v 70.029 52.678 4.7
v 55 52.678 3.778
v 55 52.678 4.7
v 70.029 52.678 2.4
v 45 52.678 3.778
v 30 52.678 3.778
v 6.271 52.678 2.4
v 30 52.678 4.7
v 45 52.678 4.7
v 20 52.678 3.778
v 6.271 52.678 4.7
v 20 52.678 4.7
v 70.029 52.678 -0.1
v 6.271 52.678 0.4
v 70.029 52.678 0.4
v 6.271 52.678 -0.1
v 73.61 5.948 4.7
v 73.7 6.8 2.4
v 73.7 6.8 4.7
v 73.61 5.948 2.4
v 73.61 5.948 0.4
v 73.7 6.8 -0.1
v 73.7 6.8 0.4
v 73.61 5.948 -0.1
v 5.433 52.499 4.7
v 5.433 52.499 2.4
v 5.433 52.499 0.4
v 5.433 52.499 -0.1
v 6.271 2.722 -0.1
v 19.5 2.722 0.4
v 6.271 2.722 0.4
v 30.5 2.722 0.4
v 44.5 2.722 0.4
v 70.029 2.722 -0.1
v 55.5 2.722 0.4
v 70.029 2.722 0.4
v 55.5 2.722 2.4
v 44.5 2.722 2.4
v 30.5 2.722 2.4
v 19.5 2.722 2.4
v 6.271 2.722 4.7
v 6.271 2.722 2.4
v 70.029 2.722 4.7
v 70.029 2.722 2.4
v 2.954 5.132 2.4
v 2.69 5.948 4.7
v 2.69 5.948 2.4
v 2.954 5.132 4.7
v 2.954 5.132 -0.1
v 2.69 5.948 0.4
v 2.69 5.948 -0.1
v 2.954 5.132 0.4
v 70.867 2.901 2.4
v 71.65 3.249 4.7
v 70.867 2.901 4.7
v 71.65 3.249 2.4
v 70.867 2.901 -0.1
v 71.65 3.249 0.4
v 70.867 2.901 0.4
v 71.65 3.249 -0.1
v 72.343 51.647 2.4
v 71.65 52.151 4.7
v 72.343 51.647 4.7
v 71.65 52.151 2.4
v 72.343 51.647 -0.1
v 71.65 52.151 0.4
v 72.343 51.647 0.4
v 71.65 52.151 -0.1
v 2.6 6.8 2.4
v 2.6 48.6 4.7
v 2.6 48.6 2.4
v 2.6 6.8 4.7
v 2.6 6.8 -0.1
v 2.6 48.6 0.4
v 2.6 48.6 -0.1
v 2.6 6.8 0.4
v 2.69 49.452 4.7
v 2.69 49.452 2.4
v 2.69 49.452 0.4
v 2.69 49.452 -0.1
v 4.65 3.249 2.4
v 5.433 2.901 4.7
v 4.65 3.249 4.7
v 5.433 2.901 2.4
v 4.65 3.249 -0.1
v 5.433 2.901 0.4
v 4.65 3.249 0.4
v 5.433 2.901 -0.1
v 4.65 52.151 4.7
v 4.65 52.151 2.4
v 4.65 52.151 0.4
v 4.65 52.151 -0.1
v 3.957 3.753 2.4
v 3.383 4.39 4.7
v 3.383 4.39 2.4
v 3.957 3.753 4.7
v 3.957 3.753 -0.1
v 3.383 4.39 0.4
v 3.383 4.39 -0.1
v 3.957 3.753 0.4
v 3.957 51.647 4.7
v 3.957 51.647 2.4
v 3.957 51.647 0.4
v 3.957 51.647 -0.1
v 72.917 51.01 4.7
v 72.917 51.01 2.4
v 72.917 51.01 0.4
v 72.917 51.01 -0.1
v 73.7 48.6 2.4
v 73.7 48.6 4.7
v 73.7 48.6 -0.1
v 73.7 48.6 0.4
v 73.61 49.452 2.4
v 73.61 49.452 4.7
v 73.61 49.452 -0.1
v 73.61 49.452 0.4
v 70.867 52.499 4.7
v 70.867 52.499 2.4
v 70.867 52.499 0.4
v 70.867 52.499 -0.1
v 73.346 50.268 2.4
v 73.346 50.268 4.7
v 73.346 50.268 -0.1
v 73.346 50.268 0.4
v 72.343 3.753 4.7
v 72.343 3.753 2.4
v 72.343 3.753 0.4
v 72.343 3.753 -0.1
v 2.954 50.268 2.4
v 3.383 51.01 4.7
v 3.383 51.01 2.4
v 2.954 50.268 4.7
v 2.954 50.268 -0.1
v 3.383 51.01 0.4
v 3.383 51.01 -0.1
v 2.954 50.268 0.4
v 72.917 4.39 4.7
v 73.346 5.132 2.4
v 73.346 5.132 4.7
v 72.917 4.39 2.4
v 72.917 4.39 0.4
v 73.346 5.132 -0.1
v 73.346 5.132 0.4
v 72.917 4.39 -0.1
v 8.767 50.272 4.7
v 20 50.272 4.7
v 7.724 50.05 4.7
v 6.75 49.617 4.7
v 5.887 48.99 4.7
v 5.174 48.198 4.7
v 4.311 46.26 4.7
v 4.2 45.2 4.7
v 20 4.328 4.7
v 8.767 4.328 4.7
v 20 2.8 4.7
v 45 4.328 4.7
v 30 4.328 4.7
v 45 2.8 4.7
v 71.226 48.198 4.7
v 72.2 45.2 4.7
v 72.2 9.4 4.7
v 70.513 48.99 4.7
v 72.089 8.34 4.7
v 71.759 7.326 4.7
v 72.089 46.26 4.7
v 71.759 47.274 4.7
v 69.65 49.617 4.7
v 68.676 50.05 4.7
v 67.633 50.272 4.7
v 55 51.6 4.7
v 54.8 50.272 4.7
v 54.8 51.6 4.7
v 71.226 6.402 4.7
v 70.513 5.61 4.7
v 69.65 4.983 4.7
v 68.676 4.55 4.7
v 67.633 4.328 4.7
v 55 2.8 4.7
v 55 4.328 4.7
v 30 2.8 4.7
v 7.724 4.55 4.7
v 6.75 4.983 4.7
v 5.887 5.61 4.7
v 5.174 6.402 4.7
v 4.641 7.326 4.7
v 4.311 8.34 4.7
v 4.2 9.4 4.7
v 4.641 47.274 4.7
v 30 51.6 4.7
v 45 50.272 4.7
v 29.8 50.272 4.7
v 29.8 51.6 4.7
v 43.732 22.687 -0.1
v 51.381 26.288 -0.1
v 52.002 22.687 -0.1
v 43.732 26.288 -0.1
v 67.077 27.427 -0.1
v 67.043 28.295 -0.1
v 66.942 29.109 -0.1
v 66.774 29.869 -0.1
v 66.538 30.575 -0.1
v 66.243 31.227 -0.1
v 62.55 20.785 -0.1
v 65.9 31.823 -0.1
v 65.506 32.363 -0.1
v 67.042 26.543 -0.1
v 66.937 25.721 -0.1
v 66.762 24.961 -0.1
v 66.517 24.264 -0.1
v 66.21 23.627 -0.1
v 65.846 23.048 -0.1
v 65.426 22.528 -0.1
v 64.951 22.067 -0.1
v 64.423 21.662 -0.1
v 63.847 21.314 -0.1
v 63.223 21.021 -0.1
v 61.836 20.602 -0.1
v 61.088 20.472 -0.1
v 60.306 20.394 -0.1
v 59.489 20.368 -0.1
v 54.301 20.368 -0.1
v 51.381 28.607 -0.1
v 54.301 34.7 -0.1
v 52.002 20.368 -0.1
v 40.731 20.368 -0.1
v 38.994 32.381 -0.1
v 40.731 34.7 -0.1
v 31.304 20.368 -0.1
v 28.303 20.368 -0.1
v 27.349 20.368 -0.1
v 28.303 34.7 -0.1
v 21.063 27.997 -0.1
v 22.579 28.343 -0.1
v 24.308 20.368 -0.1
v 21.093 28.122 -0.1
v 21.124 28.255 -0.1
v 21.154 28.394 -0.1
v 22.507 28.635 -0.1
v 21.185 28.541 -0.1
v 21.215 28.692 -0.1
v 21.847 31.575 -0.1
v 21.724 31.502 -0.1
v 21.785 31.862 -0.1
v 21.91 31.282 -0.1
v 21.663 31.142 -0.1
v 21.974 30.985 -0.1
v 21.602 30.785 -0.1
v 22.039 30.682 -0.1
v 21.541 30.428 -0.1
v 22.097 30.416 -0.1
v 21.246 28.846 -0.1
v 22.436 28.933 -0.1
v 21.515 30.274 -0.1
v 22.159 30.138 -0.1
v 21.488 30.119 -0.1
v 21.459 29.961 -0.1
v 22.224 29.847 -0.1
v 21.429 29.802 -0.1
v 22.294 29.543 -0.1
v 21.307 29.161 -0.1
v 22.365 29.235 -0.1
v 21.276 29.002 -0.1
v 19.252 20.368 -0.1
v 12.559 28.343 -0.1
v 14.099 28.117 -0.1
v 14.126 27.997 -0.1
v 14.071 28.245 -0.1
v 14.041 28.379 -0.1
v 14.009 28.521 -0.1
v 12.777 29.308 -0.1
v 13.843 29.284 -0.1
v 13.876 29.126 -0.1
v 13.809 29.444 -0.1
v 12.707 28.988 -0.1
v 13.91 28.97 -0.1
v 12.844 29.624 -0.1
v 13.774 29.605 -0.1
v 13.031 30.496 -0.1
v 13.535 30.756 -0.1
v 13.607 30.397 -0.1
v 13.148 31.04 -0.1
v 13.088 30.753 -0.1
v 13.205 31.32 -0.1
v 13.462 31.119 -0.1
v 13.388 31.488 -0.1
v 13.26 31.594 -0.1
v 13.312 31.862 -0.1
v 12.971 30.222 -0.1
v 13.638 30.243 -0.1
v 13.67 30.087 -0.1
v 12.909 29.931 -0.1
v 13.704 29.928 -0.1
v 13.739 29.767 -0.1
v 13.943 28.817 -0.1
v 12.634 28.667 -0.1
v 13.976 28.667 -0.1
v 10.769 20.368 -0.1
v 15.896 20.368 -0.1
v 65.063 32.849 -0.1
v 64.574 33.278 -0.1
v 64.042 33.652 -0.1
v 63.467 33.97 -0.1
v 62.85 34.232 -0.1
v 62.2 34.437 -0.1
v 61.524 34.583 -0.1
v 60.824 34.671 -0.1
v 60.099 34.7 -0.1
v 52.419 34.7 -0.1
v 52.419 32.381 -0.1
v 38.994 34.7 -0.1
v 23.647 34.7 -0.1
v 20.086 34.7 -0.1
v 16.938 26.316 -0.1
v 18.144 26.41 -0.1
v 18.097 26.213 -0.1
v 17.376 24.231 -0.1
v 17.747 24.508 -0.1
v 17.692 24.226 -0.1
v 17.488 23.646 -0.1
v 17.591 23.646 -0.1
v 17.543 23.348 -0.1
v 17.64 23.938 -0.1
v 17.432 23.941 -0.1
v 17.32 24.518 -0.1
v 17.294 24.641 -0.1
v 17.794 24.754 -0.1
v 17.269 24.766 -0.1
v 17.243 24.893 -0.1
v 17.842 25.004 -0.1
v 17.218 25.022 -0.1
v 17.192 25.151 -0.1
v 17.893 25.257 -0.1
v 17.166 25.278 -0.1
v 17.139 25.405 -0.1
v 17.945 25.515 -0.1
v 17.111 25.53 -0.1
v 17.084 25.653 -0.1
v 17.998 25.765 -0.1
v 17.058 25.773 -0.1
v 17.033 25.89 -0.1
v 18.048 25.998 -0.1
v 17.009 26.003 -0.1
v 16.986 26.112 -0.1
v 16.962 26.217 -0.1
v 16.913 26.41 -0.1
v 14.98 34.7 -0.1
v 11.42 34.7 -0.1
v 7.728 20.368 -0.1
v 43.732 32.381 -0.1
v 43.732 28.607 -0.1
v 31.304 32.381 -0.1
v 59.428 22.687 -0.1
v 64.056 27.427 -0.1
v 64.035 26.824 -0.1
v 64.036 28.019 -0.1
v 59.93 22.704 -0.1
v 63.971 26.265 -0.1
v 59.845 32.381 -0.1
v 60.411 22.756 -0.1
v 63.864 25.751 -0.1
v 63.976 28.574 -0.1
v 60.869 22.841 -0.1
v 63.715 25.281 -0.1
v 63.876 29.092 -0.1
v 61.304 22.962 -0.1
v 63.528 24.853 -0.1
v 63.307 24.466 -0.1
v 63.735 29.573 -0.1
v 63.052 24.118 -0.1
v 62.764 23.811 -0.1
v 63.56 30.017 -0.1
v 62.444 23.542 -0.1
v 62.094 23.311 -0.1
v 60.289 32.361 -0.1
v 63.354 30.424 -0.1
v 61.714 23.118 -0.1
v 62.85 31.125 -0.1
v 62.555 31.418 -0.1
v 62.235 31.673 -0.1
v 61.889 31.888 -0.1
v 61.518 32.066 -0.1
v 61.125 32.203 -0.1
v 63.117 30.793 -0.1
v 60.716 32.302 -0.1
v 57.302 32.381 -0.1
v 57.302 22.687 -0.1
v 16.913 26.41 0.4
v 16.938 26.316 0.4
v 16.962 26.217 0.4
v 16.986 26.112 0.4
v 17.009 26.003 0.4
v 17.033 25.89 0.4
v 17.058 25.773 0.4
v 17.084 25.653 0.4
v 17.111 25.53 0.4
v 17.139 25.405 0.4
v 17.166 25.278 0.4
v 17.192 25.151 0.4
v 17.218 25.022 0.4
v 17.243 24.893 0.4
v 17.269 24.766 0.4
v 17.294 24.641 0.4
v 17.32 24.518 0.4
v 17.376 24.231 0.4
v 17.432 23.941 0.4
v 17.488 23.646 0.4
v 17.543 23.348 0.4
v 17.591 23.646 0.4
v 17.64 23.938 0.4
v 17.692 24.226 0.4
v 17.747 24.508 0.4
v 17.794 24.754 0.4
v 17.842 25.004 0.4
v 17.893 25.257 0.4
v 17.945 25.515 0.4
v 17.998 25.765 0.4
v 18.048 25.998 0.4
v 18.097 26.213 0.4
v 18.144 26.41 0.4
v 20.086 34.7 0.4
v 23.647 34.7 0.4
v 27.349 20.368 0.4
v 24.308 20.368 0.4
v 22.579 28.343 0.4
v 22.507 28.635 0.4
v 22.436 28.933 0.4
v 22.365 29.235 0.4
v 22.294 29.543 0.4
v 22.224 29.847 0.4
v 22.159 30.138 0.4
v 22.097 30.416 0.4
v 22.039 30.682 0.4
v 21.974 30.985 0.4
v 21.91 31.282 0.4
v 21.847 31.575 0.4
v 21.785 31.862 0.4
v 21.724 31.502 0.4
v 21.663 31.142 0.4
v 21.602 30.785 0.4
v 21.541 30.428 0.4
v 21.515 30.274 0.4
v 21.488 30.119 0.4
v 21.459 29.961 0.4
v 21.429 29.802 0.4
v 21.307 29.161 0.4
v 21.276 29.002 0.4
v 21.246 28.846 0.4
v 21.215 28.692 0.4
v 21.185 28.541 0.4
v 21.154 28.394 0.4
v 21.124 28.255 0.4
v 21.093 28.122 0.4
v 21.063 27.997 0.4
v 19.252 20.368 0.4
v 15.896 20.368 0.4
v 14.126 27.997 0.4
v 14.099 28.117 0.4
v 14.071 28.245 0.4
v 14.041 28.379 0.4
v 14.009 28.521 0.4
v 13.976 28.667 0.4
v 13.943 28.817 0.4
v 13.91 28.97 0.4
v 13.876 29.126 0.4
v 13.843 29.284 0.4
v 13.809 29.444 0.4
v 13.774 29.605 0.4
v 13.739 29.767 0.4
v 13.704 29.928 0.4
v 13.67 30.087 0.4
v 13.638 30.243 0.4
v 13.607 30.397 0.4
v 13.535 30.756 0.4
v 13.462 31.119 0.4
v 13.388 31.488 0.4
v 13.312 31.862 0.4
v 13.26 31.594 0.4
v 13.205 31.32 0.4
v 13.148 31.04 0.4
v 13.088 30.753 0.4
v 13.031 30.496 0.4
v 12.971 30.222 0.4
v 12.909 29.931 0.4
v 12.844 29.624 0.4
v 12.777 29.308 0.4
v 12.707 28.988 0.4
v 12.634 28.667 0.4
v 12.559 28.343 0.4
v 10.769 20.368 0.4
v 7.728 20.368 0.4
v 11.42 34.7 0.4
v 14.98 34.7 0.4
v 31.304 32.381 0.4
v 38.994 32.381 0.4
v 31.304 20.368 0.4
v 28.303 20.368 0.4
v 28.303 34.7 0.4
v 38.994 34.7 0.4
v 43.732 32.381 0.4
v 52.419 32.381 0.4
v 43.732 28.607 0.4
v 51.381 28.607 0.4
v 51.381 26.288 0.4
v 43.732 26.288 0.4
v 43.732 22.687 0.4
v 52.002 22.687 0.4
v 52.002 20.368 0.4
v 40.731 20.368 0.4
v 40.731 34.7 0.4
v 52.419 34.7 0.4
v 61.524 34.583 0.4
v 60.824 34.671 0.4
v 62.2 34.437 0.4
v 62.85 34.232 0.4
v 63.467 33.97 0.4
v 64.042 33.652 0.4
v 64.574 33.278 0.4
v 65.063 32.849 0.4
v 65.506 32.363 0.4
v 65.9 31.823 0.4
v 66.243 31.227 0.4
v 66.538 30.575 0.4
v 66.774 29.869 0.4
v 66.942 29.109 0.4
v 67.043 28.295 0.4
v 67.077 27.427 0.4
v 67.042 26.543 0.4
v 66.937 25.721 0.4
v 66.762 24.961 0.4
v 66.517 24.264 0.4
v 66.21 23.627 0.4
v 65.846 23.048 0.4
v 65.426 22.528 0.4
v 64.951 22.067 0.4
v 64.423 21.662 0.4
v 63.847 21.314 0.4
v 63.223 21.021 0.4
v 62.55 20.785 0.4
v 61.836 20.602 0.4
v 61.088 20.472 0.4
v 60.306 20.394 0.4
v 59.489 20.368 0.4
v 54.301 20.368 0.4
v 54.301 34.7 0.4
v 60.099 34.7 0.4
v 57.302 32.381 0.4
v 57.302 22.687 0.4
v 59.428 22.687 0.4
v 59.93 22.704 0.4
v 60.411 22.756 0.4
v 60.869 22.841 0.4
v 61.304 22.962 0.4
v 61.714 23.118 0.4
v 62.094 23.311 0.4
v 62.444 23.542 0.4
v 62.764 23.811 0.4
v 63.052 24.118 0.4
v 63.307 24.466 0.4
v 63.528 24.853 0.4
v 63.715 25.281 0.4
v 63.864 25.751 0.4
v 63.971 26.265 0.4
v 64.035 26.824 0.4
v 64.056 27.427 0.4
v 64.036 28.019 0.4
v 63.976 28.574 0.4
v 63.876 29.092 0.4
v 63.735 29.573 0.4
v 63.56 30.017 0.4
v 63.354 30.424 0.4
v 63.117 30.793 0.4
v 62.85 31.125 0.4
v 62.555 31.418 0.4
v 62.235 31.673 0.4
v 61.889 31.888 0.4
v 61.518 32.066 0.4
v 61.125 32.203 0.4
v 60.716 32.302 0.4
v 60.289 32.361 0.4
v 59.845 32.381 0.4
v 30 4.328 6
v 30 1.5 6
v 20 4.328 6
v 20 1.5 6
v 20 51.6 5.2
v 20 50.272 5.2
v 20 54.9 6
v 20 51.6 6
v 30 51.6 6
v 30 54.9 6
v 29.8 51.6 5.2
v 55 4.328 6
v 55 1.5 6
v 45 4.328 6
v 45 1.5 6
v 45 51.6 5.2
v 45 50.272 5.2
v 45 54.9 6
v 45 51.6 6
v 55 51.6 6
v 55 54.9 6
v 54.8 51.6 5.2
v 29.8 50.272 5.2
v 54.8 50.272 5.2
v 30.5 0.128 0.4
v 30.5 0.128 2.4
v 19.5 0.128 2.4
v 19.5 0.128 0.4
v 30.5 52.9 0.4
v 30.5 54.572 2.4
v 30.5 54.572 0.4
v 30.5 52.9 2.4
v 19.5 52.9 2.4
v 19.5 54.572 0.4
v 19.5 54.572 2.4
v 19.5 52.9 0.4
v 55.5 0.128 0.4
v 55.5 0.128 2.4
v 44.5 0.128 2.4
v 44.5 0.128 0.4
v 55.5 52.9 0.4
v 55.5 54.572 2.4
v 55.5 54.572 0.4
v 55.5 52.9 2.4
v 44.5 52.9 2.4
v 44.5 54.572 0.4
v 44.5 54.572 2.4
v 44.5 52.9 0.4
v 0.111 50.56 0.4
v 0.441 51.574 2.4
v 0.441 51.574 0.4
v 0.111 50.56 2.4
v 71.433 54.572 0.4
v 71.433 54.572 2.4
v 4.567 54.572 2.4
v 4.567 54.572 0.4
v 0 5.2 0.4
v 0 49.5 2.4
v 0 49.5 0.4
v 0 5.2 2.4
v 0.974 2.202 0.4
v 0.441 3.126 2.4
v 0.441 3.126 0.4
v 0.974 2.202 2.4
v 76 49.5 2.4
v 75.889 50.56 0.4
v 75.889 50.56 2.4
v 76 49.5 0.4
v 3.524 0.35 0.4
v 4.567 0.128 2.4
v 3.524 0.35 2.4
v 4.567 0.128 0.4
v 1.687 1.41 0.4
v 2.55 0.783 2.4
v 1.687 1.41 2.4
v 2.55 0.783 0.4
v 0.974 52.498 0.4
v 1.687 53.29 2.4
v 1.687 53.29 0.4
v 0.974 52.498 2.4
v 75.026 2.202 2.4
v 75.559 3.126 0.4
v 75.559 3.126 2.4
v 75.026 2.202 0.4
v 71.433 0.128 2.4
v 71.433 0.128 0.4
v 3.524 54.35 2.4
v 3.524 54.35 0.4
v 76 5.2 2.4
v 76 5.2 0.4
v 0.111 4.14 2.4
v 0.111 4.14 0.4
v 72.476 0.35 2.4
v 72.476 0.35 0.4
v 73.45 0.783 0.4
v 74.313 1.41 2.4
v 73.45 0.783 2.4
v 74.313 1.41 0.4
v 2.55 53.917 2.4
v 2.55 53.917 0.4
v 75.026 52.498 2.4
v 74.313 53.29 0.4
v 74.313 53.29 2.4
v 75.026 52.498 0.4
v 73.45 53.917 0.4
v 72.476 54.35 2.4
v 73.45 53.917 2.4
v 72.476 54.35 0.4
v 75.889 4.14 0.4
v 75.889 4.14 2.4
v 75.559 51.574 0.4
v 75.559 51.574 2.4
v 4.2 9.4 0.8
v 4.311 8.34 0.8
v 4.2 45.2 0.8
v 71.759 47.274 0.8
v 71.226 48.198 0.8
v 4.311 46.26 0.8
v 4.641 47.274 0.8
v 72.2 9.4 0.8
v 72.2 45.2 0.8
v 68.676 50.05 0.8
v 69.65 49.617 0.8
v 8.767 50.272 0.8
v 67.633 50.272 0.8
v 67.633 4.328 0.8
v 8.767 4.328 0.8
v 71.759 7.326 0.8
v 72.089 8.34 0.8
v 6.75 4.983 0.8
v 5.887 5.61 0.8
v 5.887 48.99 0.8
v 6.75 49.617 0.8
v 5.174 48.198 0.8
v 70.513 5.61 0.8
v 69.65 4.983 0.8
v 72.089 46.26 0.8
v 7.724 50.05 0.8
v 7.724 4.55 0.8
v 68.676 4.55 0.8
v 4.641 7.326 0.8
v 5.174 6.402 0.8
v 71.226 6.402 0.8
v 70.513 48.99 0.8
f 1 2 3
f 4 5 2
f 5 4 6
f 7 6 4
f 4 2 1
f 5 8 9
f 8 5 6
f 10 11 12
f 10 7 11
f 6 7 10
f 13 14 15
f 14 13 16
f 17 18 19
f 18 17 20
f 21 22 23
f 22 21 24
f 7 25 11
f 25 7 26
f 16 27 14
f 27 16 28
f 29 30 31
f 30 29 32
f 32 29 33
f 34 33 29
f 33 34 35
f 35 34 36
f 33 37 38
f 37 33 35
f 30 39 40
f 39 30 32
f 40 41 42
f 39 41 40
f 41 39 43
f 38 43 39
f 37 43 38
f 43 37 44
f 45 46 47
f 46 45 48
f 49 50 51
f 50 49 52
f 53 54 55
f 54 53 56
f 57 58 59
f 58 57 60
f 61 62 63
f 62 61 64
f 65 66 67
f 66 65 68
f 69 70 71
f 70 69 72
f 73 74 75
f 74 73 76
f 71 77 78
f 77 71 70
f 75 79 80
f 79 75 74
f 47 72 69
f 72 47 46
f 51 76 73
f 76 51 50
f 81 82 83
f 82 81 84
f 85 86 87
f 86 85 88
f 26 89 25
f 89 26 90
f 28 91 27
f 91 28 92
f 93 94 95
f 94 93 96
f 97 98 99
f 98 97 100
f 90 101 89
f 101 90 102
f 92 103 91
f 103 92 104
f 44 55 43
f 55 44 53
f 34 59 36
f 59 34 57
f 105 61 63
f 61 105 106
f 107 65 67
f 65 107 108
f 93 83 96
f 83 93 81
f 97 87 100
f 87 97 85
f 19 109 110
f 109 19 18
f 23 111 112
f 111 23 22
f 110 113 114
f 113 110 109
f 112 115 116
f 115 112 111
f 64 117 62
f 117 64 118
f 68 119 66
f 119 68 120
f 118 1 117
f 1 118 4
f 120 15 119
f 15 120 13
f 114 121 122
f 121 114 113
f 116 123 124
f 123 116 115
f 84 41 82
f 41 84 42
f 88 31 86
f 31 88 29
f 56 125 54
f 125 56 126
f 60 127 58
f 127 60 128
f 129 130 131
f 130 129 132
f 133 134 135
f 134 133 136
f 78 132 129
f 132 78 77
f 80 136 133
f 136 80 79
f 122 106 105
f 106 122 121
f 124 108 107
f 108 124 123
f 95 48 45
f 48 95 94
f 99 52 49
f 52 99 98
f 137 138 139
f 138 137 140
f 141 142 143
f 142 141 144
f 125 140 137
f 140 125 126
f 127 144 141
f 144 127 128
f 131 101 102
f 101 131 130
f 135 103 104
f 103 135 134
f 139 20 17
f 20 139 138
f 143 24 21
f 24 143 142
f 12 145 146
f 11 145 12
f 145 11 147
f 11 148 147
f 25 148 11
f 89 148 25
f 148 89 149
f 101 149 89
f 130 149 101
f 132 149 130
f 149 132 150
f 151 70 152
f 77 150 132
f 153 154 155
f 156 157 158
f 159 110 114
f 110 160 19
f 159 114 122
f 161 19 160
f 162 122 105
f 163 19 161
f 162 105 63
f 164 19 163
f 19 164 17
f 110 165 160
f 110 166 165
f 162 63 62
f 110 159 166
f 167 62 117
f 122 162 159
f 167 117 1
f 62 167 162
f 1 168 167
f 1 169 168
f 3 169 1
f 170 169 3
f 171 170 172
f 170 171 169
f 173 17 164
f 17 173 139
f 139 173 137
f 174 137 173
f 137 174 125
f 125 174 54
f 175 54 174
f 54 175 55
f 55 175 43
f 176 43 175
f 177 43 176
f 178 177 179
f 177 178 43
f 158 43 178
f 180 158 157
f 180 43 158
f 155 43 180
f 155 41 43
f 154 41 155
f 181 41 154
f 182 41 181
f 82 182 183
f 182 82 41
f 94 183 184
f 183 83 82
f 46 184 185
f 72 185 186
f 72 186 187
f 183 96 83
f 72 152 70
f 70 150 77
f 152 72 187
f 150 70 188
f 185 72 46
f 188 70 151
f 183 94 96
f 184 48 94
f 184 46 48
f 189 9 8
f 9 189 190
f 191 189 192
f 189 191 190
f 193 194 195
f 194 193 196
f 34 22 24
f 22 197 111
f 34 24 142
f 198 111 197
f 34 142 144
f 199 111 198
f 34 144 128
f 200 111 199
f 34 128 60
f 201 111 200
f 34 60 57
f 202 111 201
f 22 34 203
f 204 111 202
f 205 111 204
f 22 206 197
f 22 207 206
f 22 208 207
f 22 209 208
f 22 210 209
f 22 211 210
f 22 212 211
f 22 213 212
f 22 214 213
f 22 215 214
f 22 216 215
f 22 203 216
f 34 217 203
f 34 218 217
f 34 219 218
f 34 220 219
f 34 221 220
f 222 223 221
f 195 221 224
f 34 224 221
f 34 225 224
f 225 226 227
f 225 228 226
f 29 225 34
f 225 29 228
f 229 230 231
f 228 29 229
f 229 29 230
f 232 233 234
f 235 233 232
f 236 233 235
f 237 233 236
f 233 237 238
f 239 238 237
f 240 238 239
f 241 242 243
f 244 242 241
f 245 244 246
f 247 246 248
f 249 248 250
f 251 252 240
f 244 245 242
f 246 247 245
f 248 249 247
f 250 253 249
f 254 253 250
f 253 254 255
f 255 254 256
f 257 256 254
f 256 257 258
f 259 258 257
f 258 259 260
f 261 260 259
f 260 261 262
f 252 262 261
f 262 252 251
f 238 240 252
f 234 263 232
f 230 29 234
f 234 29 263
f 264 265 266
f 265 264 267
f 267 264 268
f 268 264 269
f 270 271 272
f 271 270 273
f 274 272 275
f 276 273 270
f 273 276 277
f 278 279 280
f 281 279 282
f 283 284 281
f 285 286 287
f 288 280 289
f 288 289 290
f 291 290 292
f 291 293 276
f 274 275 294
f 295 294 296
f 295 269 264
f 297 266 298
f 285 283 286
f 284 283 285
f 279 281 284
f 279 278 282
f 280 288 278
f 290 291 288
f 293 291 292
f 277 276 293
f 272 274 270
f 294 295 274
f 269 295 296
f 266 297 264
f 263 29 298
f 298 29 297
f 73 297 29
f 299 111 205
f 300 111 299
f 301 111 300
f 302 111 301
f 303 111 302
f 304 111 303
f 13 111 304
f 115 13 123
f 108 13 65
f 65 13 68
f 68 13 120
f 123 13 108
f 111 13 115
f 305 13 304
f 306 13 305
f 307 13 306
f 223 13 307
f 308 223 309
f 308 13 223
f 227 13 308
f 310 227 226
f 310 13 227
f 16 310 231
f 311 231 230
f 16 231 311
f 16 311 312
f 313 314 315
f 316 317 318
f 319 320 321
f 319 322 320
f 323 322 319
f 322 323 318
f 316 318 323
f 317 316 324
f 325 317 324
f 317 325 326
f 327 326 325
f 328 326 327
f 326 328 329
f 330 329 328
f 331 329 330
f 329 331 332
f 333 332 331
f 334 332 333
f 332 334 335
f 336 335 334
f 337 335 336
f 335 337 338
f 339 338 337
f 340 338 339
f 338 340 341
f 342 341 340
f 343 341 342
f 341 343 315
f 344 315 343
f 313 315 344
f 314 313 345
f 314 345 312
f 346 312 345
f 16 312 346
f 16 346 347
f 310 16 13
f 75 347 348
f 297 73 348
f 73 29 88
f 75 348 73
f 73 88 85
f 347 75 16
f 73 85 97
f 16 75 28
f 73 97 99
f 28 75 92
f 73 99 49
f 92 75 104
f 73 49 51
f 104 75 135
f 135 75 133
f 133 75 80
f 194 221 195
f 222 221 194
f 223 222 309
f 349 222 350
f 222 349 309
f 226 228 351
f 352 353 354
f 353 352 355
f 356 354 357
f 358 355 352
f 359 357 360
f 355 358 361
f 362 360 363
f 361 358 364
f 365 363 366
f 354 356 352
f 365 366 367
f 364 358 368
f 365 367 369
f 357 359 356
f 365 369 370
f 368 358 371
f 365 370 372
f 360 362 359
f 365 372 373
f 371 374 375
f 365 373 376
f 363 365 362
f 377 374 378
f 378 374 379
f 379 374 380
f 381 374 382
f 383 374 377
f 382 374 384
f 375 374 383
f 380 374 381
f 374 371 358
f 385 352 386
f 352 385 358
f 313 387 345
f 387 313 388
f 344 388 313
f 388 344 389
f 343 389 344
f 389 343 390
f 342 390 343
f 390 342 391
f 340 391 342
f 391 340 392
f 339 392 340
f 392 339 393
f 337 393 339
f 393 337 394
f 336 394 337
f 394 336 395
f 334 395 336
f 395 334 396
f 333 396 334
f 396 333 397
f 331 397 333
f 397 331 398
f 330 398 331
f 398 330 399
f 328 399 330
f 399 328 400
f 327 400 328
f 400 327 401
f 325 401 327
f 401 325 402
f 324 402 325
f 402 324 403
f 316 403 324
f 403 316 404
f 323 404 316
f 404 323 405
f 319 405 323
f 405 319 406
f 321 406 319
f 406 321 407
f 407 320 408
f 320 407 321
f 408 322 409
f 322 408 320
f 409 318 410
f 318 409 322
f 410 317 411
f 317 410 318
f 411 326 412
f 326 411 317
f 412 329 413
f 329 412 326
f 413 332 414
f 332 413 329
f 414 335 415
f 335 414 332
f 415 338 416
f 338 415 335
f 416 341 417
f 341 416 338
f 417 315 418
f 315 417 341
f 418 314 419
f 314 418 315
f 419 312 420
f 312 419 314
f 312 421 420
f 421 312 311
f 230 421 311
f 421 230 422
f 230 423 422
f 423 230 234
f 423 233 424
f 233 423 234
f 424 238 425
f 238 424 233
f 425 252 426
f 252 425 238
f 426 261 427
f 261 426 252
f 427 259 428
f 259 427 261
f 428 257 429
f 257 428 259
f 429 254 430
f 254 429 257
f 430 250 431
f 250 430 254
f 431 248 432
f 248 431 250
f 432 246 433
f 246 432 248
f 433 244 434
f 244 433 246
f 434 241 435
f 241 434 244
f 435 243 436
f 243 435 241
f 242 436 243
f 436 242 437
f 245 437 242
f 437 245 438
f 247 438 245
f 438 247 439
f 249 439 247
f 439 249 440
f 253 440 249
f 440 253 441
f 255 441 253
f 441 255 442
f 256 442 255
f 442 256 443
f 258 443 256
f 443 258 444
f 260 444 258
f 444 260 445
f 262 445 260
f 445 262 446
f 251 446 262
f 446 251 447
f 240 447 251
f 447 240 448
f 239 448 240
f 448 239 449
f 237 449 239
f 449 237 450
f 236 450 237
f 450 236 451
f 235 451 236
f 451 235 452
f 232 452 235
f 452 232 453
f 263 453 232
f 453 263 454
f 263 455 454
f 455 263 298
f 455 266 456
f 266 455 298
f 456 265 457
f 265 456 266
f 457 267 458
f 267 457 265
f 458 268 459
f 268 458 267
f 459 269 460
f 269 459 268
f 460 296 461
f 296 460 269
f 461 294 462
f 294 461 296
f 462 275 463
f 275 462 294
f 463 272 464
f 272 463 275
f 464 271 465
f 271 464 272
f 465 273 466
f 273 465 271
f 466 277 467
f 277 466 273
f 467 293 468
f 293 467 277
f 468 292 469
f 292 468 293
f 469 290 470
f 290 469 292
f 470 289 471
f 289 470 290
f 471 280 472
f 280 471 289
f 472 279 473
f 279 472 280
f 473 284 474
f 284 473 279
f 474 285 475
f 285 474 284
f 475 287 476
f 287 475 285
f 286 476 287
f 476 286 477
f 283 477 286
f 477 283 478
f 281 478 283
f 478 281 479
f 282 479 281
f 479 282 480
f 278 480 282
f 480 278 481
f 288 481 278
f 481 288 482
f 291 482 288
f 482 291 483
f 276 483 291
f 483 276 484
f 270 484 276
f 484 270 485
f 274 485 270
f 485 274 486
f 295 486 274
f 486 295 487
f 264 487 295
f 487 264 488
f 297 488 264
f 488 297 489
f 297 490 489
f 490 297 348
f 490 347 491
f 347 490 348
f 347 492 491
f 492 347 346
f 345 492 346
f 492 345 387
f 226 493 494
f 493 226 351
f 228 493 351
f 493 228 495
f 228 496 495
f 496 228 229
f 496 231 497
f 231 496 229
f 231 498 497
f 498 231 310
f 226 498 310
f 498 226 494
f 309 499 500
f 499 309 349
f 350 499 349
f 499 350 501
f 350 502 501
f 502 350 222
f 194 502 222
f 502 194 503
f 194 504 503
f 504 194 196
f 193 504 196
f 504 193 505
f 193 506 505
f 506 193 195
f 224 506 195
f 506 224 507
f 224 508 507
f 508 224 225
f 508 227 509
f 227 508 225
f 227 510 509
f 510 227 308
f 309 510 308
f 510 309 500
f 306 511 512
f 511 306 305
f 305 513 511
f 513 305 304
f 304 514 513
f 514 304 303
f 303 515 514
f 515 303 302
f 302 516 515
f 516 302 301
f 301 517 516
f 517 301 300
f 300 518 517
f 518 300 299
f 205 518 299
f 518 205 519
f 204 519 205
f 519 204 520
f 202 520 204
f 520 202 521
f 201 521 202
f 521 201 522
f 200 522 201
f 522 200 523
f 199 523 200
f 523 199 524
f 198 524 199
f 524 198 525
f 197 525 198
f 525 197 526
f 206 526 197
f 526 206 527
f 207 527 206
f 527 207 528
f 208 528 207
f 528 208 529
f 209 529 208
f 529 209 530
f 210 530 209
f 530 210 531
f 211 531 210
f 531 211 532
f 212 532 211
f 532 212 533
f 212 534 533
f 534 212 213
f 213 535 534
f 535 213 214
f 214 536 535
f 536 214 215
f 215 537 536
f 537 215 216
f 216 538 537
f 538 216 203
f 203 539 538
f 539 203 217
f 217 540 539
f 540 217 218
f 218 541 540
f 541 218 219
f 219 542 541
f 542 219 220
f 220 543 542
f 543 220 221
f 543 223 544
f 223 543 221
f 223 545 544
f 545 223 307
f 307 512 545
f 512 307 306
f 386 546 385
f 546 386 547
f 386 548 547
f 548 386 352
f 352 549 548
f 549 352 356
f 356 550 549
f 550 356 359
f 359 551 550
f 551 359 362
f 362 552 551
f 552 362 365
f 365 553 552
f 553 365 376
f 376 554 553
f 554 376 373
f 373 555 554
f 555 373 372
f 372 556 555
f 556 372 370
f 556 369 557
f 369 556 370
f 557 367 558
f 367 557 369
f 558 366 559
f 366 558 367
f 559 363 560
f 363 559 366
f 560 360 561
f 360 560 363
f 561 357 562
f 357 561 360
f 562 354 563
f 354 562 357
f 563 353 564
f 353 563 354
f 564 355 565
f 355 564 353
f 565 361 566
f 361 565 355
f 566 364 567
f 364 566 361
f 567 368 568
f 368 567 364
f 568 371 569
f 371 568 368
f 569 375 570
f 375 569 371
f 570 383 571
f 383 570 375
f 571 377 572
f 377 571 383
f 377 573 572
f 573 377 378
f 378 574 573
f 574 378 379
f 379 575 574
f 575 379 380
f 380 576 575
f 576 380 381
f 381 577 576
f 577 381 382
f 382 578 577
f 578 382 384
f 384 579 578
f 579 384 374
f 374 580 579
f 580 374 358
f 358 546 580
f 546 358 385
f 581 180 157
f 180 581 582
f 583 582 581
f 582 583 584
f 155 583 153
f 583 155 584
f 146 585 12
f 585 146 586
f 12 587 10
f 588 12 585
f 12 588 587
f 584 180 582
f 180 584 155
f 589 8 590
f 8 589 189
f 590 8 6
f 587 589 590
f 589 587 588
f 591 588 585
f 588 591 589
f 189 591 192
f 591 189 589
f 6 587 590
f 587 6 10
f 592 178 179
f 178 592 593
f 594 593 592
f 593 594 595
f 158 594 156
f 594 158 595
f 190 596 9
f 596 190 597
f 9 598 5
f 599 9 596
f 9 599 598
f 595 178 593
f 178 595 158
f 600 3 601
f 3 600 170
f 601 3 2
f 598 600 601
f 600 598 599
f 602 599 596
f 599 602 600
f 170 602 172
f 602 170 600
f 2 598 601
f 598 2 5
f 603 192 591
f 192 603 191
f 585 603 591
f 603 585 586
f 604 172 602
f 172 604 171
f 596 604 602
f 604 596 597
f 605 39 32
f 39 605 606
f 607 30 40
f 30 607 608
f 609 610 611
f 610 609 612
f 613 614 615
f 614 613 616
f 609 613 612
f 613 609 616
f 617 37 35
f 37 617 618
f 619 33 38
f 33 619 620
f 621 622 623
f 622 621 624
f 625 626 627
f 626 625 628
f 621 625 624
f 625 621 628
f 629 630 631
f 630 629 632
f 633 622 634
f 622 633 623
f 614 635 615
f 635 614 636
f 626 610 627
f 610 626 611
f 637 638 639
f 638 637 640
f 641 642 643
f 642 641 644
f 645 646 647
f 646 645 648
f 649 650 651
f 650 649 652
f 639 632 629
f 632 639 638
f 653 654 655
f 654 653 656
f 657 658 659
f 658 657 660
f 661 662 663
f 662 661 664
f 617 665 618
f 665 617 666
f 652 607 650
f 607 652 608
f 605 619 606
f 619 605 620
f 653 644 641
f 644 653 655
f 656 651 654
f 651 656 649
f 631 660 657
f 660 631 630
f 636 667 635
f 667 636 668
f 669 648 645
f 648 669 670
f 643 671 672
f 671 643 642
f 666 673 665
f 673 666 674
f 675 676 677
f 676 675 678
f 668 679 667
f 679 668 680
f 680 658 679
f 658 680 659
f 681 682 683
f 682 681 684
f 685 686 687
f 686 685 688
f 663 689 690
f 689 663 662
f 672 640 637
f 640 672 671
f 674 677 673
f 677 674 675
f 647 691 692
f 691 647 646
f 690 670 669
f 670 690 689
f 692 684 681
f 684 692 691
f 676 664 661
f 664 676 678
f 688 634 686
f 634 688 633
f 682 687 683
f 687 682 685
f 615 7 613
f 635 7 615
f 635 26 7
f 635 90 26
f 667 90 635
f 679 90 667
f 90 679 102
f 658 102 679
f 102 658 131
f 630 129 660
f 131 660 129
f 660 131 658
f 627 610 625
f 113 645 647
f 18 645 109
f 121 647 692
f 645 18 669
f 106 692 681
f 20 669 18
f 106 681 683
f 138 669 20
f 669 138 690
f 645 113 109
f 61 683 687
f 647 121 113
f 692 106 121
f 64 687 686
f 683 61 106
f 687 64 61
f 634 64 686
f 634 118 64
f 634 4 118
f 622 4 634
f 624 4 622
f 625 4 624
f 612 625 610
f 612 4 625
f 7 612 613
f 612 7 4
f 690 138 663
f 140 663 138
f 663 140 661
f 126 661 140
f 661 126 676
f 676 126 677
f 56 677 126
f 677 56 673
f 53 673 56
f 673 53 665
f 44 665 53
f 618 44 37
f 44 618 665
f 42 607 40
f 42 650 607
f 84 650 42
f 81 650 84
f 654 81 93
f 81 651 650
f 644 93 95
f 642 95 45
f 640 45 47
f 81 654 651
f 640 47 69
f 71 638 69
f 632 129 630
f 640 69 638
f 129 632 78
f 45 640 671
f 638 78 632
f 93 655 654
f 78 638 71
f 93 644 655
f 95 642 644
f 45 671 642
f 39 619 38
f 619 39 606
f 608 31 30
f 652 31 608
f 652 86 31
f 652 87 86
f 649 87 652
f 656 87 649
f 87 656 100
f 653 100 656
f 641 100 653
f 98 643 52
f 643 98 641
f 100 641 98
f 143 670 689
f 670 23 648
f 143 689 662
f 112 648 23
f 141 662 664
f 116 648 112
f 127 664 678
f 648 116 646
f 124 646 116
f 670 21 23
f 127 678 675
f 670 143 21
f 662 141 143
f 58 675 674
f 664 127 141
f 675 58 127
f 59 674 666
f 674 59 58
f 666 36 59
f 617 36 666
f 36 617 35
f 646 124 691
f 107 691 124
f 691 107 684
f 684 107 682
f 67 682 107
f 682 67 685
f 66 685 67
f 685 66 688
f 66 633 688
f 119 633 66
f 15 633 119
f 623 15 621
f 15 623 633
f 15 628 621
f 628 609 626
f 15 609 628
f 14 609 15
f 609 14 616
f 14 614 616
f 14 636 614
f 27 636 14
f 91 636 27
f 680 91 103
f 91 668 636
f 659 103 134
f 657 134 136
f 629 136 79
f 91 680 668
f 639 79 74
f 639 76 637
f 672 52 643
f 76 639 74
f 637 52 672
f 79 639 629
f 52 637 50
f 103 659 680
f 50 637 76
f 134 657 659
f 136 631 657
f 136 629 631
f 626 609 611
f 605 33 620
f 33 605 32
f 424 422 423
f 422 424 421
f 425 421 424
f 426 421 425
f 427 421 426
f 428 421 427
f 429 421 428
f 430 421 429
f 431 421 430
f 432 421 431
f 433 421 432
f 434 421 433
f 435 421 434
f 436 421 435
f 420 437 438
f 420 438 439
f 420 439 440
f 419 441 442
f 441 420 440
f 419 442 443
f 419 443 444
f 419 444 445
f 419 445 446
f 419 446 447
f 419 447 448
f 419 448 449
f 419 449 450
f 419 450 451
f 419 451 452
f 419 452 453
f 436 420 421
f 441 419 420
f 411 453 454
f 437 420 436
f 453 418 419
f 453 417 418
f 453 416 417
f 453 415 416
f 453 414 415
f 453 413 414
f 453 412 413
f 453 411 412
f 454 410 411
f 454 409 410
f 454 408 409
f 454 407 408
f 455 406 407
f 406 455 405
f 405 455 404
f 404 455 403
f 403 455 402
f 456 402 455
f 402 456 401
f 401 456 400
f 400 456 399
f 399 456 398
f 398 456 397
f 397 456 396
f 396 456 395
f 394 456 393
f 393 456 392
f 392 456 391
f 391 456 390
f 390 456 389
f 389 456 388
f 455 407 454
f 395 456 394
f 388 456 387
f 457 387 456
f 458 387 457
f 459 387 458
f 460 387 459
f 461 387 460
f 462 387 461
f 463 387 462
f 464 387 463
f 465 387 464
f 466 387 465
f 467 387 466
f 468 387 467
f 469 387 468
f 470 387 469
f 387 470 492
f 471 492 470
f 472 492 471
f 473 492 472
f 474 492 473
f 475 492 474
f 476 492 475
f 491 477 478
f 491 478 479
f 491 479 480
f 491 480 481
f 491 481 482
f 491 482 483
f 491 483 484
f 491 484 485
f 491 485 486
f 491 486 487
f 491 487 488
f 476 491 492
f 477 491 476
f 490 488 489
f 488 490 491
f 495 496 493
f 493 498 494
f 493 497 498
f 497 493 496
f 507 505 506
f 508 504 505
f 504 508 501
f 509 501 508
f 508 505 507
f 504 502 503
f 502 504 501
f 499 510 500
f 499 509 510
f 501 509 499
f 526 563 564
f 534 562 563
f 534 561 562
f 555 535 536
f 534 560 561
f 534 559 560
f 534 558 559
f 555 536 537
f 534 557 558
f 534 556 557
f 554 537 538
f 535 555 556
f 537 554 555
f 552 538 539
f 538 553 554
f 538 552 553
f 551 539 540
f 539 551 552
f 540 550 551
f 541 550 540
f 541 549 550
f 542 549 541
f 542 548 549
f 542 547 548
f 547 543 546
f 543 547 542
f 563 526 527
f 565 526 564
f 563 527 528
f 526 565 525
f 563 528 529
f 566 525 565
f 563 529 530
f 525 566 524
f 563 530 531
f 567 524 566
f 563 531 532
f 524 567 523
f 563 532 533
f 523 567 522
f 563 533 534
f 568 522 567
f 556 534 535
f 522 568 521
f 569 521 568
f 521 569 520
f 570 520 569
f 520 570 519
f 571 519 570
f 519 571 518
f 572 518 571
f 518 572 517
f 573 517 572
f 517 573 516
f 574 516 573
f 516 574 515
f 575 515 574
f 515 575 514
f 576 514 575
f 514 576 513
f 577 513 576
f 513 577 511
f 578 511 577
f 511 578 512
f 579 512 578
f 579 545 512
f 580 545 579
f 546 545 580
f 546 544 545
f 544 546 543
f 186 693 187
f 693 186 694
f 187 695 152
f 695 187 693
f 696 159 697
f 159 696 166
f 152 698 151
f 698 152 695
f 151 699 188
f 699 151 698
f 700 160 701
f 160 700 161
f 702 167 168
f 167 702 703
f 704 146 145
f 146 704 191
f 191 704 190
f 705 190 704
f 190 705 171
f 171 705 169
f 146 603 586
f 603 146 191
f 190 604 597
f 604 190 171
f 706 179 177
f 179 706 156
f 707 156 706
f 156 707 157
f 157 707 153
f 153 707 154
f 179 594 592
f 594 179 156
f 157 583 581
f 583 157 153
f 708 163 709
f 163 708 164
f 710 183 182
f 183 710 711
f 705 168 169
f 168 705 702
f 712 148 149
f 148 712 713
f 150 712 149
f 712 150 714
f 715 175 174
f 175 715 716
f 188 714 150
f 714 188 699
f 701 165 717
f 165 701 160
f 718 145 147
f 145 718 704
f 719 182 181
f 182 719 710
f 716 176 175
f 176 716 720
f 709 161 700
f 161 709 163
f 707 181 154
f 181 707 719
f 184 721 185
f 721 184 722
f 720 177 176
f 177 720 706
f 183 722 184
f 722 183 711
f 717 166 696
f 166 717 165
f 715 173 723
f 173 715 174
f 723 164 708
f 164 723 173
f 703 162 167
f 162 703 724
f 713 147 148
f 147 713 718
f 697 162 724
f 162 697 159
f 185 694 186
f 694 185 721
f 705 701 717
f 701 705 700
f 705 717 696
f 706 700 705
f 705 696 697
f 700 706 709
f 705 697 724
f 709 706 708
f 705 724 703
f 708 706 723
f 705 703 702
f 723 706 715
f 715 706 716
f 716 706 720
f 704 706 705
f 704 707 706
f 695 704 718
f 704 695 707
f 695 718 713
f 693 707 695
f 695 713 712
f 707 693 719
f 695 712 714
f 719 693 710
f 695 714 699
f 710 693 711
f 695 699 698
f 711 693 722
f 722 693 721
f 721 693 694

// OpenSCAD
// file: _item_wirebox.scad
/*
 The optional box for power and neopixeljack
*/
use <_item_case.scad>
use <cuberounded.scad>

module wirebox(){
  translate([-4.5,-4.5,4.6])
  union(){
    difference(){
      cuberounded([45.0,58.4,27],5.1);
      
      //removes box attachment with a small gap
      translate([-59.1,6.5,-2.6])
      thebox();
      
      //removes box attachment with offset for top
      translate([-59,6.5,55])
      mirror([0,0,1])
      thebox();
      
      //removes box attachment with offset for bottom
      translate([-59,6.5,-28])
      thebox();
      
      // removes box inner negative
      translate([-0.1,0,-0.1])
      cube([11.4,58.6,27.5]);
      
      // innerspace
      translate([19,3,2])
      cube([21.4,52,22]);
      
      translate([0,15,6])
      cube([20,29,17]);
      
      
      translate([0,4,-0.1])
      cube([14.4,50.5,3]);
      
      // Power hole
      translate([43.6,40,14])
      //11.5
      rotate([90,0,90])
      cylinder(r=5.75,h=1.5);
      
      // Power hole inner
      translate([40.3,40,14])
      //11.5
      rotate([90,0,90])
      cylinder(r=6.75,h=3.5);
      
      // Neopixeljack
      translate([40.3,15,12])
      union(){
        cube([4.8,8,4.5]);
        
        translate([0,2,0])
        cube([4.8,4,7.5]);
        
        translate([3.7,-1,-1.2])
        cube([1.1,10,6.9]);
      }
    }
  }
}

wirebox();
// file: _item_case.scad
/*
 The box for the first versions of wled shield case
*/
use <_item_lid.scad>
use <cuberounded.scad>

module sidestickholder(){
  translate([5,-1,7.5])
  cube([6.5,2,18.5]);
  
  translate([62.7,-1,6.4])
  cube([5,2,19]);
}

module pickers(sticks=false){
  picker(sticks);

  translate([0,41.2,0])
  picker(sticks);

  translate([56.2,0.2,0])
  picker(sticks);

  translate([56.2,41.2,0])
  picker(sticks);
}

module picker(stick=false){
  translate([8.5,2.5,8])
  union(){
    rotate([180,0,0])
    cylinder(4.5,1.8,0.5);
    
    if (stick){
      translate([0,0,-1.5])
      cylinder(h=20.0,r=2.3);
      
      translate([0,0,17.5])
      cylinder(h=1,r=5.3);
    }
  }
}

module fixinghole(){
  union(){
    cylinder(1.4,3.2,3.2);
    
    translate([0,0,1.0])
    cylinder(1.1,2.8,2.8);
    
    translate([0,0,3.-1])
    cylinder(1.4,2.3,2.3);
    
    translate([0,0,3.0])
    cylinder(1.4,3.2,3.2);
  }
}

module mesh(size=[1,1,1]){
  size=(size[0]==undef) ? [size,size,size] : size;
  
  linear_extrude(size[2])
  for(rx=[0:size[0]-1]){
    translate([rx*4,,0])
    for(ry=[0:size[1]-1]){
      translate([0,ry*9,0])
      union(){
        polygon(points=[[0,0],[3,0],[0,3]],paths=[[0,1,2]],convexity=10);
        
        translate([0,1,0])
        polygon(points=[[3,3],[0,3],[3,0]],paths=[[0,1,2]],convexity=10);
        
        translate([0,5,0])
        polygon(points=[[3,3],[3,0],[0,0]],paths=[[0,1,2]],convexity=10);
        
        translate([0,6,0])
        polygon(points=[[0,0],[3,3],[0,3]],paths=[[0,1,2]],convexity=10);
      }
    }
  }
}

module wireholes(){
  fixinghole();

  translate([0,5,0])
  fixinghole();

  translate([0,10,0])
  fixinghole();

  translate([0,15,0])
  fixinghole();

  translate([0,20,0])
  fixinghole();

  translate([0,25,0])
  fixinghole();
}

module thebox(){
  
  sidestickholder();
  
  translate([0,46.2,0])
  sidestickholder();
  
  pickers(sticks=true);
  
  translate([-4.5,-4.5,4.6])
  difference(){
    // The BOX
    translate([-2,-2,-2])
    cuberounded([80,58.5,27],5.1);
    
    // Space for the lid
    prelid();
    
    // Inner Grind
    translate([3.4,3.4,-1]) 
    cuberounded([69.4,48.4,22.5],4.1);
    
    // Frontside cabel injection hole 
    translate([72,11,-4])
    cuberounded([7,33.2,14.9],0.8,true);
    
    // Frontside cabel injection hole 
    translate([74.5,9,-3])
    cuberounded([2.0,37.2,16.9],0.8,true);
    
    // Backside ventilation
    translate([3.5,10,0])
    rotate([-90,-90,90])
    scale([2,2,1.5])
    mesh([3,2,4]);
    
    // Leftside inner tag WLED
    translate([66.6,3.7,4])
    rotate([90,0,0])
    linear_extrude(0.5)
    text("WLED",15,font="Liberation Sans:style=Bold",halign="right");
    
    // Leftside outside tag WLED
    translate([69.6,-1.5,3.4])
    rotate([90,0,0])
    linear_extrude(0.5)
    text("WLED",15,font="Liberation Sans:style=Bold",halign="right");
    
    translate([4.5,4.5,-5])
    union(){
      // Button hole
      translate([31.8,53,22.5])
      rotate([90,90,0])
      cylinder(h=4,r1=2,r2=2.4);
      translate([27.5,50,27.3])
      rotate([90,90,0])
      cube([9,9,4.5]);
      
      // wire attachments
      translate([58.5,9.7,26.0])
      wireholes();
      
      //displaywindow inner
      translate([-2.2,-1.6,0])
      translate([12.7,9.4,26.4])
      cuberounded([14,30.5,2],0.4);
      cube(0);
      
      //displaywindow outer
      translate([-2.2,-1.6,0])
      translate([13.3,11.6,26.4])
      cuberounded([13,27.5,4],0.5);
      cube(0);
      
      // mesh below display
      translate([2,0,0])
      translate([27.7,1,26.4])
      scale([1.5,1.65,1.5])
      mesh([1,3,4]);
      
      // mesh below display line 2
      translate([13,44.6,0])
      translate([27.7,1,26.4])
      scale([1.5,1.65,1.5])
      rotate([0,0,180])
      mesh([1,3,4]);
      
      // mesh on top of display
      translate([1,1,26.4])
      mesh([1,5,4]);
      
      // Signes for holes
      translate([48,8,29.3])
      linear_extrude(3)
      union(){
        translate([21,0,0])
        rotate([0,0,90])
        text("IN",6,font="Liberation Sans:style=Bold");
        
        translate([20.5,8.4,0])
        rotate([0,0,90])
        text("|",6,font="Liberation Sans:style=Bold");
        
        translate([21,11.6,0])
        rotate([0,0,90])
        text("LED",6,font="Liberation Sans:style=Bold");
        
        translate([7,0,0])
        text("PWR",4,font="Liberation Sans:style=Bold",halign="right");
        
        translate([7,5.1,0])
        text("GND",4,font="Liberation Sans:style=Bold",halign="right");
        
        translate([7,10.2,0])
        text("GND",4,font="Liberation Sans:style=Bold",halign="right");
        
        translate([7,15.3,0])
        text("5V",4,font="Liberation Sans:style=Bold",halign="right");
        
        translate([7,20.4,0])
        text("CLK",4,font="Liberation Sans:style=Bold",halign="right");
        
        translate([7,25.5,0])
        text("Data",4,font="Liberation Sans:style=Bold",halign="right");
      }
    }
  }
}

module case(){
  translate([-4.5,4.5,29.6])
  rotate([0,180,0])
  thebox();
}

case();
// file: wled_shield_case.scad
/*
  All components for the wled shield case
*/
// Rednerquality 0.01 for print 0.9 for dev
$fs = 0.01;

use <_item_lid.scad>;
translate([4,4,0])
lid();

use <_item_case.scad>;
translate([-4,4,0])
case();

use <_item_wirebox.scad>;
translate([-40,-55,-4])

wirebox();
// file: cuberounded.scad
module cuberounded(size=[1,1,1],radius=1,xonly=false){
  size=(size[0]==undef)?[size,size,size]:size;
  
  translate_min=radius;
  translate_xmax=size[0]-radius;
  translate_ymax=size[1]-radius;
  translate_zmax=size[2]-radius;
  
  hull()
  for (translate_x=[translate_min,translate_xmax]){
    for (translate_y=[translate_min,translate_ymax]){
      for (translate_z=[translate_min,translate_zmax]){
        translate([translate_x,translate_y,translate_z])
        rotate((xonly==true)?[0,90,0]:[0,0,0])
        cylinder(h=radius*2,r=radius,center=true);
      }
    }
  }
}

include <wled_shield_case.scad>
// main file
/*
 The lid for the case
*/
use <cuberounded.scad>

module picker(stick=false){
  translate([8.5,2.5,8])
  union(){
    rotate([180,0,0])
    cylinder(4.5,1.8,0.5);
    
    if (stick){
      translate([0,0,-2.5])
      cylinder(h=24.0,r=2.3);
      
      translate([0,0,17.5])
      cylinder(h=4.1,r=5.3);
    }
  }
}

module anchor(m=false,length=10.2,size=3.5){
  difference(){
    cube([length-0.2,size-0.2,size-0.2]);

    translate([m?length:-0.1,m?0:size-0.1,m?0:-0.1])
    rotate([m?0:180,-90,0])
    linear_extrude(length)
    polygon(points=[[0,0],[size,size],[0,size]],paths=[[0,1,2]],convexity=1);
  }
}


module opener(){
  cube([11,4,2.3]);
  
  translate([0,53,-0.1])
  cube([11,5,2.3]);
}

module snaphelper(){
  translate([20,3.4,-1.3])
  union(){
    cube([9.8,48.4,2.5]);
    
    translate([25,0,0])
    cube([9.8,48.4,2.5]);
  }
}

module backlid_snapins(){
  translate([20,1.4,-1.3])
  union(){
    backlid_snapinset_rl();
    
    translate([25,0,0])
    backlid_snapinset_rl();
  }
}

module backlid_snapinset_rl(){
  anchor();
  
  translate([0,50.1,0])
  anchor(m=true);
}

module prelid(){
  translate([2.6,2.6,-7.5])
  difference(){
    cuberounded([71.1,50,5],4.1);
    
    translate([-0.1,-0.1,-8.8])
    cube([72,52,12.2]);
    
    translate([65,32,4])
    rotate([180,0,0])
    linear_extrude(2)
    text("WLED",15,font="Liberation Sans:style=Bold",halign="right");
  }
  
  backlid_snapins();
  
  color("azure",0.15)
  snaphelper();
  
  translate([0,0,-28.6])
  difference(){
    cuberounded([76,54.5,27],5.1);
    
    translate([-0.1,-0.1,-2])
    cuberounded([76.2,54.7,27],5.1);
    
    translate([19.5,-0.2,24.9])
      union(){
        opener();
        
        translate([25,0,0])
        opener();
      }
  }
}

module lid(){
  translate([0,0.1,4])
  difference(){
    prelid();
    
    translate([4.2,4.2,5])
    cuberounded([68,46,2],5.1);
  }
}

lid();
